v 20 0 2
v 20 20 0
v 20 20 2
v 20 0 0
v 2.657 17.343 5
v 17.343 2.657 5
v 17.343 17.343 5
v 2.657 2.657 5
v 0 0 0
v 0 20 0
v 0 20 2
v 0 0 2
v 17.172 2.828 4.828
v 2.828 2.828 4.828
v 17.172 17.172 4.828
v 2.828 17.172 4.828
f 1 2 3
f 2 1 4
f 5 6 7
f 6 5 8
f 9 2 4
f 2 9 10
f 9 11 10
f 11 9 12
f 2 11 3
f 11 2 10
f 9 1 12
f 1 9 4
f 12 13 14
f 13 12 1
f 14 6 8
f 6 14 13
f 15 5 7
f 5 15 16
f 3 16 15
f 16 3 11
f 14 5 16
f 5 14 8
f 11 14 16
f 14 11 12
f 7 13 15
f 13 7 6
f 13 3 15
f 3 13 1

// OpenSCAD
// file: ../OpenSCAD/HourOfCode.scad
tileHeight = 5;

module tile(x, y) {

    difference() {
        difference() {
            difference(){
                difference() {
                    translate([x, y, 0])
                        cube([20,20,tileHeight]);

                translate([x , y , tileHeight-3])
                    rotate([45,0,0])
                        cube([20, 4, 4]);
                } 
            translate([x , y + 20, tileHeight-3])
                rotate([45,0,0])
                    cube([20, 4, 4]);
            }

        translate([x , y , tileHeight-3])
            rotate([45,0,90])
               cube([20, 4, 4]);
        }
        translate([x + 20, y + 0, tileHeight-3])
            rotate([45,0,90])
               cube([20, 4, 4]);
    }

}



module cog(x, y) {
    translate([x, y, 0]) {
        cube([20, 20, 1]);
        translate([10, 10, 1]) {
            scale([0.25, 0.25, 0.25]) {
                surface(file = "../OpenSCAD/HourOfCodeCog.png", center = true, convexity = 5);
            }
        }
    }
}

module cross(x, y) {
    translate([x, y, 0]) {
        cube([20, 20, 1]);
            translate([10, 10, 15]) {
            rotate([0, 0, 0]) {
                scale([0.18, 0.18, 0.15]) {
                    surface(file = "../OpenSCAD/HourOfCodeCross.png", invert = true, center = true, convexity = 5);
                }
            }
        }
    }
}

module boxes(x, y) {
    translate([x, y, 0]) {
        cube([20, 20, 1]);
        translate([6, 1, 0])
            rotate([0, 0, 45])
                cube([7, 7, 7]);
        translate([8, 11, 0])
            rotate([0, 0, 10])
                cube([7, 7, 7]);
        translate([14, 3, 0])
            rotate([0, 0, 40])
                cube([7, 7, 7]);
        translate([8, 6, 7])
            rotate([0, 0, 0])
                cube([7, 7, 7]);
    }
}

module boardTest() {
    difference() {
        cube([50, 50, 10]);
        translate([5, 5, 5])
            cube([40, 40, 6]);
    }
    translate([5, 5, 3])
        for (tx =[0:20:30]) 
            for (ty =[0:20:30]) {
                tile(tx,ty);
            }
}

module board() {
    difference() {
        cube([170, 170, 10]);
        translate([5, 5, 5])
            cube([160, 160, 6]);
    }
    translate([5, 5, 3])
        for (tx =[0:20:150]) 
            for (ty =[0:20:150]) {
                tile(tx,ty);
            }
}

module topPiece(x, y) {
    translate([x + 20, y, 8]) {
    rotate([0, 180, 0]) {
        difference() {
            translate([0, 0, 2]) 
                cube([20, 20, 6]);
            tile(0, 0);
        }
    }
}
}

/*
for (tx =[0:22:60]) {
    topPiece(tx, 0);
}
*/



/*
translate([0, 0, 0])
    color("Blue", 0.5)
        cog(0, 0);
//translate([0, 20, 0])
//    rotate([180, 0, 0])
//        topPiece(0, 0);


translate([0, -25, 0])
    color("Red", 0.5)
        cross(0, 0);
//translate([0, -5, 0])
//    rotate([180, 0, 0])
//        topPiece(0, 0);
*/


//tile(0, 0);
//board();
//boardTest();
//topPiece(0,0);
//cog(0, 0);
//cross(0, 0);



  
// main file
include <../OpenSCAD/HourOfCode.scad>;

/*
// ------------------------------------------------------------- //
// ------------------------------------------------------------- //
//                        T O    U S E  ;                        //
// 1. Create a file and add the following line at the top;       //
include <../OpenSCAD/HourOfCode.scad>; // already done in this file
// 2. Use one of the following templates;                        
//tile(x, y);   // build a tile, which a top piece can fit on
//board();      // build an 8 x 8 board of tiles
//boardTest();  // build a 2 x 2 board of tiles
//topPiece(x,0);// build a top piece, which will fit on top of the board
//cog(x, y);    // build a cog, to fit on top of a top piece (scrap metal)
//cross(x, y);  // build a cross, to fit on top of a top piece (bandit)
//boxes(x, y)   // build a pile of boxes, to fit on top of a top piece (obstacle)
// where x and y are the coordinates used to place the model (0, 0 works well)
*/
// ------------------------------------------------------------- //
// ------------------------------------------------------------- //

tile(0, 0);
